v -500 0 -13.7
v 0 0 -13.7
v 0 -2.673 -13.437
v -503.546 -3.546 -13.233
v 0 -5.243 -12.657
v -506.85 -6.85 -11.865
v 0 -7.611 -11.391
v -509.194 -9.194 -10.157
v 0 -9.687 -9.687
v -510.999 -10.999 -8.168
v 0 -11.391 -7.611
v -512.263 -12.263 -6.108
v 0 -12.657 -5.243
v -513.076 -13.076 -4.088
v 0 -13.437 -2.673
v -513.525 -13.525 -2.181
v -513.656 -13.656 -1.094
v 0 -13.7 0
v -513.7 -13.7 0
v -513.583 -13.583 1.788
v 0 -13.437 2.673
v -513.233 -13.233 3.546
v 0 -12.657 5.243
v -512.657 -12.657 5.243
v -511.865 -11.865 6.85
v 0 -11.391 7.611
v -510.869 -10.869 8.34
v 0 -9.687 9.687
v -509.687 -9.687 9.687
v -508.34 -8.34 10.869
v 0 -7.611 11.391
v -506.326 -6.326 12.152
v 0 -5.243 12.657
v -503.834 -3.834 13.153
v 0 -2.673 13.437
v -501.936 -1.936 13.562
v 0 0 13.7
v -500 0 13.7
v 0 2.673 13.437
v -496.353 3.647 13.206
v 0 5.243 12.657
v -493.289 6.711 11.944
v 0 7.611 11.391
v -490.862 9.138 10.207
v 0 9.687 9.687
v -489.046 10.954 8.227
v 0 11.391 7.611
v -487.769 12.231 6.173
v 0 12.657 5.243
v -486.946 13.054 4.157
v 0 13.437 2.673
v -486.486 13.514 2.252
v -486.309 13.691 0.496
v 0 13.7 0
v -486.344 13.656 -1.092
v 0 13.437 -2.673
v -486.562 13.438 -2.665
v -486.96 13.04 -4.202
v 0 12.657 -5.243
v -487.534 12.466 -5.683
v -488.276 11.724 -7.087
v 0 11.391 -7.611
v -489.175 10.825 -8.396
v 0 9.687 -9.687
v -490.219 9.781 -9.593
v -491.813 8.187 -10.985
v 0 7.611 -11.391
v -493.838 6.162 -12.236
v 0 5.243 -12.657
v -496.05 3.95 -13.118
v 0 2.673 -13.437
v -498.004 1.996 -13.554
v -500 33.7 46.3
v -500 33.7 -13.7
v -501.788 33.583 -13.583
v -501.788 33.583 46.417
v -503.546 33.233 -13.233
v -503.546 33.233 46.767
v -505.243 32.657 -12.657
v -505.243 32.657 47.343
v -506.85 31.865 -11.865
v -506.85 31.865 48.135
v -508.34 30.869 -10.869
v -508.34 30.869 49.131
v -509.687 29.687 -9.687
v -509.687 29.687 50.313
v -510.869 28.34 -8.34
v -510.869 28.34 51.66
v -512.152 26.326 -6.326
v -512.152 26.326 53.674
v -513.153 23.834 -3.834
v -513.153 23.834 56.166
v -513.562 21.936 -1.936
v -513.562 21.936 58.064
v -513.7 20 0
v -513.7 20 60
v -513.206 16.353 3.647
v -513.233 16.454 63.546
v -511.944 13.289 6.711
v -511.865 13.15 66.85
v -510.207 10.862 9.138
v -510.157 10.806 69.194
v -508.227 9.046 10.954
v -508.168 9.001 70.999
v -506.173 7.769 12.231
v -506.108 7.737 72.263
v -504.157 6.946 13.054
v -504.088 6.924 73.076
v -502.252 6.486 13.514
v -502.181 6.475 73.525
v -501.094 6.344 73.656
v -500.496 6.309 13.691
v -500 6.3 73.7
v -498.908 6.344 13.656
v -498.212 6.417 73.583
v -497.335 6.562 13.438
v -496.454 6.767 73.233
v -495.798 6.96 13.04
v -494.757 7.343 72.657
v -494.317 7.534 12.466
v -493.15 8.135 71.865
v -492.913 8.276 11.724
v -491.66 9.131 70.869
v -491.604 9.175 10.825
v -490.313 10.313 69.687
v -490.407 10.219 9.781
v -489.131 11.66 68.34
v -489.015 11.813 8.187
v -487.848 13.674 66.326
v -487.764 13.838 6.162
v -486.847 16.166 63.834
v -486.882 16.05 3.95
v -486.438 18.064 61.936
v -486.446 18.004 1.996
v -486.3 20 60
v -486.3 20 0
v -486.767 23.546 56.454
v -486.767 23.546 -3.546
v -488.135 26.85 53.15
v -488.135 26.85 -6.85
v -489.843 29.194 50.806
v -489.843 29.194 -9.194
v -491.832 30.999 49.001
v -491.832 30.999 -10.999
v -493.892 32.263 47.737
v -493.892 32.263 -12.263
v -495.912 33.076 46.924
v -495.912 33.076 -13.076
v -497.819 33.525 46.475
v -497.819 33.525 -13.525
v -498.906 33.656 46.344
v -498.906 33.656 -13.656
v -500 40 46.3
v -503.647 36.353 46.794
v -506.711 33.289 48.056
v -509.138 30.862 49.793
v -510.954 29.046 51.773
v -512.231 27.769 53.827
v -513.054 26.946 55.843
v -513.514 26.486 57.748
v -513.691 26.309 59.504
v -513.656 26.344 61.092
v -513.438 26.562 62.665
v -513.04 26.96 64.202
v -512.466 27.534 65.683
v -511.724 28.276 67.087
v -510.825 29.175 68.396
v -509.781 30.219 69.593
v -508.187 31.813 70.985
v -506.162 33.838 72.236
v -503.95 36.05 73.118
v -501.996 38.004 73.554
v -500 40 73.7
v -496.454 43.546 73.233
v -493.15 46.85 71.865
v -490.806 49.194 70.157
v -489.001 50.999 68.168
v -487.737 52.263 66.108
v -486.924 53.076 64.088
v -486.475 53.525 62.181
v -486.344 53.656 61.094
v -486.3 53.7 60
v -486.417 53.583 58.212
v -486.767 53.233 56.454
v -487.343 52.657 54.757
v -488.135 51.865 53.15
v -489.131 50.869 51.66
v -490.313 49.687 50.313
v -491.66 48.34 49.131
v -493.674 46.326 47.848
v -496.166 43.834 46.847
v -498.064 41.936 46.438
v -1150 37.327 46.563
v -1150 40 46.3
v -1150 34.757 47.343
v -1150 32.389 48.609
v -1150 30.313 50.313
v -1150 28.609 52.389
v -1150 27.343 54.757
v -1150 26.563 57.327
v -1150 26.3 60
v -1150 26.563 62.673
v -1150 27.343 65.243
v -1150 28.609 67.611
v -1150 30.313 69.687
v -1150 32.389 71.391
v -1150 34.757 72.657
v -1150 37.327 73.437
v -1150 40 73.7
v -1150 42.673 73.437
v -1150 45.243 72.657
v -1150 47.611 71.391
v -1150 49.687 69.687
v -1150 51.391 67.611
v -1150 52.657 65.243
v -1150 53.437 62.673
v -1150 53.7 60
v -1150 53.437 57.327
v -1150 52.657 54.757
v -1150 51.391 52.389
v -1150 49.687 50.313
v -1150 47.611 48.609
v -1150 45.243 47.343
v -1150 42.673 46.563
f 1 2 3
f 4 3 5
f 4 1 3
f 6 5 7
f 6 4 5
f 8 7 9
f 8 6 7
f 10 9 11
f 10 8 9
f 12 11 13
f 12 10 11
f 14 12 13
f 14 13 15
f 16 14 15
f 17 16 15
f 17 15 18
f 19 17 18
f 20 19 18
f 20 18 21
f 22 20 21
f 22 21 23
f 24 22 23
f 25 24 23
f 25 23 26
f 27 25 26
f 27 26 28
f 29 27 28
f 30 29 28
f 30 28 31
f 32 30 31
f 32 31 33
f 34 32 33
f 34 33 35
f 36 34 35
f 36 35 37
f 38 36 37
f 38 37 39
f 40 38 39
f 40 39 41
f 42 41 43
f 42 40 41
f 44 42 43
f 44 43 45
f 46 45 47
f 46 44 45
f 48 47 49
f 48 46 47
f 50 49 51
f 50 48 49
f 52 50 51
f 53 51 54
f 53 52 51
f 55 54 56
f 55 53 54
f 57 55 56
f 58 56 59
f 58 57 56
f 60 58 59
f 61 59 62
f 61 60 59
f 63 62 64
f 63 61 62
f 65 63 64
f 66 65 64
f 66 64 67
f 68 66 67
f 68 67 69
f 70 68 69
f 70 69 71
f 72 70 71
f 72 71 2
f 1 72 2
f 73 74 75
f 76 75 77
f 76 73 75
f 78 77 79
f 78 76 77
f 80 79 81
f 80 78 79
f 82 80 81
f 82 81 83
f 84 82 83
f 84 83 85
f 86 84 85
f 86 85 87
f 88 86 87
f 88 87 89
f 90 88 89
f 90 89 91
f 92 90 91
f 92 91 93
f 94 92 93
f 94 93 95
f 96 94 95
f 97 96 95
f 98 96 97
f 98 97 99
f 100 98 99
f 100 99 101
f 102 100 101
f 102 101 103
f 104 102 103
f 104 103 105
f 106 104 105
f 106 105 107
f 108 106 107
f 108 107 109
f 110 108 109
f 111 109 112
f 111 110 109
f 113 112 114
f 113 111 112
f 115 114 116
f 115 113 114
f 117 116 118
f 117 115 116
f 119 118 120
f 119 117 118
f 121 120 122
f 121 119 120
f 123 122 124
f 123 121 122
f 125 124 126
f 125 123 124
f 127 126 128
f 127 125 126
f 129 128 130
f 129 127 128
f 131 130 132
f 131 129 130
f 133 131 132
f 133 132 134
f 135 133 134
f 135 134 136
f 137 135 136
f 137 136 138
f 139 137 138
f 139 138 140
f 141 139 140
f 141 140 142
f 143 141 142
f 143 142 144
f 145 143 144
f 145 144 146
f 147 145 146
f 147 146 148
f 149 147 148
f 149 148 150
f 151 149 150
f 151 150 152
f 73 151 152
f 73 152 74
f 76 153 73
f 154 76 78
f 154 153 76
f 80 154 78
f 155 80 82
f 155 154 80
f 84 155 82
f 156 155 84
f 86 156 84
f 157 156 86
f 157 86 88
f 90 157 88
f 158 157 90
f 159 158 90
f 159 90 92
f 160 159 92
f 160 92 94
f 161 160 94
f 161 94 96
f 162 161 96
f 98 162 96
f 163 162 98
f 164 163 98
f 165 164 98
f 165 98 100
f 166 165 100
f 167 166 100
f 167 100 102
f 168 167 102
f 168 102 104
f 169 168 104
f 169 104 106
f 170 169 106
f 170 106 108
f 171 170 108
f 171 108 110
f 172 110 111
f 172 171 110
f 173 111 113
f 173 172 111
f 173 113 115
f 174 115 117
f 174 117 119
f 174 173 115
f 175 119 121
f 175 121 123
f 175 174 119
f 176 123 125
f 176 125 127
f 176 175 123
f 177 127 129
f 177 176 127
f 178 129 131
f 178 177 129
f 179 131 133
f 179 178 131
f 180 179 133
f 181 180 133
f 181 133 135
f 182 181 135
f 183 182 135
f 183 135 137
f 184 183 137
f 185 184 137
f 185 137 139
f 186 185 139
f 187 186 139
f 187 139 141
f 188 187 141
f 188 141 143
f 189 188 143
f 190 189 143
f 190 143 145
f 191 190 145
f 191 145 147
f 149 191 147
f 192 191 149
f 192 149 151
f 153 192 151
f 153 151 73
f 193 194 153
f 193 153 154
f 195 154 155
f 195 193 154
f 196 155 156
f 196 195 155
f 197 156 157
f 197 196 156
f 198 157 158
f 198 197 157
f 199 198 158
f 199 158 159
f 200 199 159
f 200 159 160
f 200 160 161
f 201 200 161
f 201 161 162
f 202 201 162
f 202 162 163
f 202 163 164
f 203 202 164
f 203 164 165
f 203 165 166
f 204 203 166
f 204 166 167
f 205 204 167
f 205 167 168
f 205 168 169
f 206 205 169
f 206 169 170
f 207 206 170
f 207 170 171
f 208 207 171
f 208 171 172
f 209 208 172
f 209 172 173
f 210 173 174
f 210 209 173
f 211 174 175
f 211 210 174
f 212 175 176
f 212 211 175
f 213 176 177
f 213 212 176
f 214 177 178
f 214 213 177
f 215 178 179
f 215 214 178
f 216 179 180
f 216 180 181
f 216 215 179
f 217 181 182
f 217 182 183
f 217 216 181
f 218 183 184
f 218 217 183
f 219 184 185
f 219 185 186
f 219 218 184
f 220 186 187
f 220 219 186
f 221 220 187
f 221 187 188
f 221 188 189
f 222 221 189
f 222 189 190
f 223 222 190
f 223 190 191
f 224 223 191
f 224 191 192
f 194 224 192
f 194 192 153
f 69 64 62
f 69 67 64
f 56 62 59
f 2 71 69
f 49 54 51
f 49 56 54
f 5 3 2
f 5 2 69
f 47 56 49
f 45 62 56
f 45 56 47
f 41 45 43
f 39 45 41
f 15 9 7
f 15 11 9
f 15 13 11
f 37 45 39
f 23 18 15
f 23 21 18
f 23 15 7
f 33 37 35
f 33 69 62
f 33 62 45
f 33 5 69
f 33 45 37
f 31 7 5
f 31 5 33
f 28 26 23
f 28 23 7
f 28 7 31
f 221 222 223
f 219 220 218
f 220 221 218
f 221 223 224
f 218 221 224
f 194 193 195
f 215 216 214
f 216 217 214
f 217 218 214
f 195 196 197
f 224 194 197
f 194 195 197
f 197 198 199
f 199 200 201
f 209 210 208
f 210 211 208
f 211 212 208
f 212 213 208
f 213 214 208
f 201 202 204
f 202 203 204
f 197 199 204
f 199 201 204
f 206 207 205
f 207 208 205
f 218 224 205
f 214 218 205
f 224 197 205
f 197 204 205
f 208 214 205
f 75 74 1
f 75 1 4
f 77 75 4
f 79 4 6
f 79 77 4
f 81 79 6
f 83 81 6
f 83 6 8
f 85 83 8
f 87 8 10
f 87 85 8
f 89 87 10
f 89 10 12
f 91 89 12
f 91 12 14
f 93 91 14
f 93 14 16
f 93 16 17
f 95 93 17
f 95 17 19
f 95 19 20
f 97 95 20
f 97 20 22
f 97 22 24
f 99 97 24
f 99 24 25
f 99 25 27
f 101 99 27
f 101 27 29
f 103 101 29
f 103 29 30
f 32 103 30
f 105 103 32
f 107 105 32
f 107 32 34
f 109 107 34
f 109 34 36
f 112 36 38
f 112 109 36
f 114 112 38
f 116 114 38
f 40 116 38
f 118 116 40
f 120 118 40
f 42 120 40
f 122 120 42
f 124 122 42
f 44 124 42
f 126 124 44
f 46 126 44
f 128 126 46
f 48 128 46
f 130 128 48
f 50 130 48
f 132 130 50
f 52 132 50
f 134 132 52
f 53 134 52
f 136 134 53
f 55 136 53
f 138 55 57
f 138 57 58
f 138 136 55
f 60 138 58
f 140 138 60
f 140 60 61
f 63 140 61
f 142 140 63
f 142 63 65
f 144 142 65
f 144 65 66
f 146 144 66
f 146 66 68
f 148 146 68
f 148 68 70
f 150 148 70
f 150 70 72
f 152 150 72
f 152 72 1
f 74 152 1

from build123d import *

# Parameters (mm, degrees)
CROQUIS1_R = 13.7


with BuildPart() as part:
    # Barrer1: sweep along a curve in space
    with BuildLine() as barrer1_path:
        Line((0, 0, 0), (-500, 0, 0))
        Line((-500, 0, 0), (-500, 20, 0))
        Line((-500, 20, 0), (-500, 20, 60))
        Line((-500, 20, 60), (-500, 40, 60))
        Line((-500, 40, 60), (-1150, 40, 60))
    # Croquis1 → Barrer1 (sweep)
    with BuildSketch(Plane(origin=(0, 0, 0), x_dir=(0, 0, -1), z_dir=(1, 0, 0))):
        Circle(CROQUIS1_R)
    sweep(path=barrer1_path.line, transition=Transition.RIGHT)


solid = part.part
